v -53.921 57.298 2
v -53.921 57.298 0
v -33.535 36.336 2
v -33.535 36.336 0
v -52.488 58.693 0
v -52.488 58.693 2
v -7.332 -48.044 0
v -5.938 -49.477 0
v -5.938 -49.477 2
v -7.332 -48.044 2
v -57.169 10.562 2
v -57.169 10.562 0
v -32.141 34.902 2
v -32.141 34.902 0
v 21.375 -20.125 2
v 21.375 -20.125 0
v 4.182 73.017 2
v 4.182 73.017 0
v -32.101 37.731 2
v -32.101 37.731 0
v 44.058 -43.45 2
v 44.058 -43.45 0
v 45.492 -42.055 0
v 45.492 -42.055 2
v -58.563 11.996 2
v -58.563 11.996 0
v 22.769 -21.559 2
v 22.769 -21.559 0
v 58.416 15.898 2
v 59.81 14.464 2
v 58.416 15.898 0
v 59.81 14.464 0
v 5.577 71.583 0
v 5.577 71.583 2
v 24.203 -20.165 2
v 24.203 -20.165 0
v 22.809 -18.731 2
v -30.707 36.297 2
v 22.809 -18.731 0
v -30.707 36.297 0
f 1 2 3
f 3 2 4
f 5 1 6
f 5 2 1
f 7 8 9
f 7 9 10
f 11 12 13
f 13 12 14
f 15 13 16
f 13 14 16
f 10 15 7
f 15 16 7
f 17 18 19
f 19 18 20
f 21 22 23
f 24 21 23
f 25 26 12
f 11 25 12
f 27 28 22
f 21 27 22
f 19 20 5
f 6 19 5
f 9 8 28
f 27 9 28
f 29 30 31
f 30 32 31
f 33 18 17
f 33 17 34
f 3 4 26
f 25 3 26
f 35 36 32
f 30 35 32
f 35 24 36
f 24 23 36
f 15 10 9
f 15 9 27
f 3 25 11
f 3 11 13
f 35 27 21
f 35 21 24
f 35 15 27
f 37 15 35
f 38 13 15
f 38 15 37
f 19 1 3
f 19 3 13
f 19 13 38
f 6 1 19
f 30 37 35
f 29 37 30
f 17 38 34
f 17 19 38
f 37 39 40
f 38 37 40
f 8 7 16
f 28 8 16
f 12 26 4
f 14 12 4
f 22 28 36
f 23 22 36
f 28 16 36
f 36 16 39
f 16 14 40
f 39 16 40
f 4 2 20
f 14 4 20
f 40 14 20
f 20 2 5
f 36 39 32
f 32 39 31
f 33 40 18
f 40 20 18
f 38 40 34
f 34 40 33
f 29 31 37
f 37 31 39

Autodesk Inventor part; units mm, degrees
ref_plane "YZ Plane" through (0, 0, 0) normal (1, 0, 0) x (0, 1, 0)
ref_plane "XZ Plane" through (0, 0, 0) normal (0, 1, 0) x (-1, 0, 0)
ref_plane "XY Plane" through (0, 0, 0) normal (0, 0, 1) x (1, 0, 0)
sketch "Sketch1" plane through (0, 0, 0) normal (0, 0, 1) x (1, 0, 0)
  arc A0 (5.5811, -56.8606) -> (20.209, -64.6836) centre (38.8796, -12.1848) ccw construction
  arc A1 (-7.6539, -43.4667) -> (5.5811, -56.8606) centre (37.8873, -11.7018) ccw construction
  arc A2 (-7.6539, -43.4667) -> (-31.2183, -12.0793) centre (-386.265, -303.1724) ccw construction
  arc A3 (-31.2183, -12.0793) -> (-63.3277, 19.0744) centre (-191.6112, -145.2692) ccw construction
  arc A4 (-67.5206, 26.3221) -> (-63.3277, 19.0744) centre (-54.6162, 28.9507) ccw construction
  arc A5 (-66.9469, 41.0059) -> (-67.5206, 26.3221) centre (-15.6776, 31.6496) ccw construction
  line L0 (-66.9469, 41.0059) -> (-50.7446, 56.9005) construction
  arc A6 (-3.6955, 79.7027) -> (-26.0985, 81.0785) centre (-17.6076, 36.2535) ccw construction
  arc A7 (1.4491, 74.6716) -> (-3.6955, 79.7027) centre (-6.1453, 72.0517) ccw construction
  arc A8 (2.6831, 69.1533) -> (1.4491, 74.6716) centre (-18.5892, 67.2935) ccw construction
  arc A9 (2.6831, 69.1533) -> (3.1898, 63.5624) centre (229.5421, 86.8959) ccw construction
  arc A10 (3.1898, 63.5624) -> (8.7161, 49.818) centre (30.4167, 66.5265) ccw construction
  arc A11 (8.7161, 49.818) -> (19.0471, 39.3259) centre (47.1297, 77.3097) ccw construction
  arc A12 (19.0471, 39.3259) -> (32.6891, 29.8296) centre (104.4845, 147.5139) ccw construction
  arc A13 (32.6891, 29.8296) -> (50.5655, 19.6706) centre (502.3948, 835.5524) ccw construction
  arc A14 (57.8671, 12.5741) -> (50.5655, 19.6706) centre (33.0101, -5.6965) ccw construction
  arc A15 (67.0572, -4.125) -> (57.8671, 12.5741) centre (18.4686, -19.9867) ccw construction
  arc A16 (68.9532, -23.0115) -> (67.0572, -4.125) centre (24.8632, -17.8992) ccw construction
  line L1 (-52.1723, 55.4999) -> (-51.76, 55.076) construction
  line L2 (43.4701, -39.9764) -> (43.0518, -39.5463) construction
  line L3 (42.0363, -41.3708) -> (43.4701, -39.9764) construction
  line L4 (-4.1456, -47.7345) -> (58.0182, 12.7211)
  line L5 (56.6239, 14.1548) -> (-5.54, -46.3007)
  line L6 (-55.3767, 12.3052) -> (3.7843, 69.8404)
  line L7 (2.3899, 71.2742) -> (-56.7711, 13.739)
  line L8 (-56.7711, 13.739) -> (-55.3767, 12.3052)
  line L9 (2.3899, 71.2742) -> (3.7843, 69.8404)
  line L10 (-52.1723, 55.4999) -> (-50.7446, 56.9005) construction
  line L11 (-4.1456, -47.7345) -> (-5.54, -46.3007)
  line L12 (58.0182, 12.7211) -> (56.6239, 14.1548)
  line L13 (-51.76, 55.076) -> (-50.3262, 56.4704)
  line L14 (41.618, -40.9406) -> (43.0518, -39.5463)
  line L15 (-51.76, 55.076) -> (41.618, -40.9406)
  line L16 (-50.3262, 56.4704) -> (-50.7446, 56.9005) construction
  line L17 (-50.7446, 56.9005) -> (-26.0985, 81.0785) construction
  line L18 (43.0518, -39.5463) -> (-50.3262, 56.4704)
  line L19 (41.618, -40.9406) -> (42.0363, -41.3708) construction
  point P0 (0, 0)
  point P1 (-8.2693, 4.2237)
  point P2 (-4.9861, 4.7501)
  point P3 (-66.0155, 22.3561)
  point P4 (24.203, -20.1649)
  point P5 (22.8086, -18.7311)
  point P6 (-30.7071, 36.2969)
  point P7 (-32.1015, 37.7306)
  point P8 (-33.5353, 36.3363)
  point P9 (-32.1409, 34.9025)
  point P10 (21.3749, -20.1255)
  point P11 (22.7692, -21.5593)
  point P12 (22.8086, -18.7311)
  point P13 (-30.7071, 36.2969)
  point P14 (-32.1409, 34.9025)
  point P15 (21.3749, -20.1255)
  point P16 (24.203, -20.1649)
  point P17 (22.7692, -21.5593)
  point P18 (-33.5353, 36.3363)
  point P19 (-32.1015, 37.7306)
  dimension "d244" = 2
  dimension "d245" = 2
  dimension "d251" = 0.6
  dimension "d252" = 0.6
  dimension "d253" = 2
extrude "Extrusion12" add sketch "Sketch1" along normal blind 2
move faces "Move1" translate (1.7922, 1.743, 0) faces at (3.3195, 70.3184, 0.6667)
move faces "Move2" translate (1.7922, 1.743, 0) faces at (57.5534, 13.199, 0.6667)
move faces "Move3" translate (-1.7922, -1.743, 0) faces at (-4.6104, -47.2565, 1.3333)
move faces "Move4" translate (-1.7922, -1.743, 0) faces at (-56.3063, 13.2611, 0.6667)
move faces "Move5" translate (-2.1613, 2.2224, 0) faces at (-50.8042, 56.0056, 0.6667)
move faces "Move6" translate (2.4402, -2.5091, 0) faces at (42.0959, -40.4758, 0.6667)
properties part number "print009_Guss_innen_erweitert"
